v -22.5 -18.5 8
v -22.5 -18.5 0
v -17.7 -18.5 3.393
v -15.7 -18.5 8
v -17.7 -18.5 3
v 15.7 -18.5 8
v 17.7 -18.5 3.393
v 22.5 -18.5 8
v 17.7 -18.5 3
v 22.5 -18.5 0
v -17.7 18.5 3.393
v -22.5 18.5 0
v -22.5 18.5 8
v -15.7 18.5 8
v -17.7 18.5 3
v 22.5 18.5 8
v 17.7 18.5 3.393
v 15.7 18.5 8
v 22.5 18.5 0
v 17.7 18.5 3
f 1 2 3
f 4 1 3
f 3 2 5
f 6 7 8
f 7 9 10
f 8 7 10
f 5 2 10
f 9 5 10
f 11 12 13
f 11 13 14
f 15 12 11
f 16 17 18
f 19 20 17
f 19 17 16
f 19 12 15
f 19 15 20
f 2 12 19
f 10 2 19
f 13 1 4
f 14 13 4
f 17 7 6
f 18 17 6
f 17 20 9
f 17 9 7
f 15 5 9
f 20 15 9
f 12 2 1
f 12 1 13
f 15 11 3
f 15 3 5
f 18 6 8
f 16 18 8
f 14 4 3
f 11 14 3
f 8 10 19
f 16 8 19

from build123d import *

# Parameters (mm, degrees)
F0_W     = 45
F0_H     = 37
F1_DEPTH = 8
F3_DEPTH = 37.001


with BuildPart() as f1:
    # F0 (on Top) → F1 (new body)
    with BuildSketch(Plane.XY):
        Rectangle(F0_W, F0_H)
    extrude(amount=F1_DEPTH)

    # F2 (on face) → F3 (cut, through all)
    with BuildSketch(Plane.XZ.offset(18.5)):
        Polygon((15.7, 8), (-15.7, 8), (-17.7, 3.392867), (-17.7, 3), (17.7, 3), (17.7, 3.392867), align=None)
    extrude(amount=-F3_DEPTH, mode=Mode.SUBTRACT)


solid = f1.part
